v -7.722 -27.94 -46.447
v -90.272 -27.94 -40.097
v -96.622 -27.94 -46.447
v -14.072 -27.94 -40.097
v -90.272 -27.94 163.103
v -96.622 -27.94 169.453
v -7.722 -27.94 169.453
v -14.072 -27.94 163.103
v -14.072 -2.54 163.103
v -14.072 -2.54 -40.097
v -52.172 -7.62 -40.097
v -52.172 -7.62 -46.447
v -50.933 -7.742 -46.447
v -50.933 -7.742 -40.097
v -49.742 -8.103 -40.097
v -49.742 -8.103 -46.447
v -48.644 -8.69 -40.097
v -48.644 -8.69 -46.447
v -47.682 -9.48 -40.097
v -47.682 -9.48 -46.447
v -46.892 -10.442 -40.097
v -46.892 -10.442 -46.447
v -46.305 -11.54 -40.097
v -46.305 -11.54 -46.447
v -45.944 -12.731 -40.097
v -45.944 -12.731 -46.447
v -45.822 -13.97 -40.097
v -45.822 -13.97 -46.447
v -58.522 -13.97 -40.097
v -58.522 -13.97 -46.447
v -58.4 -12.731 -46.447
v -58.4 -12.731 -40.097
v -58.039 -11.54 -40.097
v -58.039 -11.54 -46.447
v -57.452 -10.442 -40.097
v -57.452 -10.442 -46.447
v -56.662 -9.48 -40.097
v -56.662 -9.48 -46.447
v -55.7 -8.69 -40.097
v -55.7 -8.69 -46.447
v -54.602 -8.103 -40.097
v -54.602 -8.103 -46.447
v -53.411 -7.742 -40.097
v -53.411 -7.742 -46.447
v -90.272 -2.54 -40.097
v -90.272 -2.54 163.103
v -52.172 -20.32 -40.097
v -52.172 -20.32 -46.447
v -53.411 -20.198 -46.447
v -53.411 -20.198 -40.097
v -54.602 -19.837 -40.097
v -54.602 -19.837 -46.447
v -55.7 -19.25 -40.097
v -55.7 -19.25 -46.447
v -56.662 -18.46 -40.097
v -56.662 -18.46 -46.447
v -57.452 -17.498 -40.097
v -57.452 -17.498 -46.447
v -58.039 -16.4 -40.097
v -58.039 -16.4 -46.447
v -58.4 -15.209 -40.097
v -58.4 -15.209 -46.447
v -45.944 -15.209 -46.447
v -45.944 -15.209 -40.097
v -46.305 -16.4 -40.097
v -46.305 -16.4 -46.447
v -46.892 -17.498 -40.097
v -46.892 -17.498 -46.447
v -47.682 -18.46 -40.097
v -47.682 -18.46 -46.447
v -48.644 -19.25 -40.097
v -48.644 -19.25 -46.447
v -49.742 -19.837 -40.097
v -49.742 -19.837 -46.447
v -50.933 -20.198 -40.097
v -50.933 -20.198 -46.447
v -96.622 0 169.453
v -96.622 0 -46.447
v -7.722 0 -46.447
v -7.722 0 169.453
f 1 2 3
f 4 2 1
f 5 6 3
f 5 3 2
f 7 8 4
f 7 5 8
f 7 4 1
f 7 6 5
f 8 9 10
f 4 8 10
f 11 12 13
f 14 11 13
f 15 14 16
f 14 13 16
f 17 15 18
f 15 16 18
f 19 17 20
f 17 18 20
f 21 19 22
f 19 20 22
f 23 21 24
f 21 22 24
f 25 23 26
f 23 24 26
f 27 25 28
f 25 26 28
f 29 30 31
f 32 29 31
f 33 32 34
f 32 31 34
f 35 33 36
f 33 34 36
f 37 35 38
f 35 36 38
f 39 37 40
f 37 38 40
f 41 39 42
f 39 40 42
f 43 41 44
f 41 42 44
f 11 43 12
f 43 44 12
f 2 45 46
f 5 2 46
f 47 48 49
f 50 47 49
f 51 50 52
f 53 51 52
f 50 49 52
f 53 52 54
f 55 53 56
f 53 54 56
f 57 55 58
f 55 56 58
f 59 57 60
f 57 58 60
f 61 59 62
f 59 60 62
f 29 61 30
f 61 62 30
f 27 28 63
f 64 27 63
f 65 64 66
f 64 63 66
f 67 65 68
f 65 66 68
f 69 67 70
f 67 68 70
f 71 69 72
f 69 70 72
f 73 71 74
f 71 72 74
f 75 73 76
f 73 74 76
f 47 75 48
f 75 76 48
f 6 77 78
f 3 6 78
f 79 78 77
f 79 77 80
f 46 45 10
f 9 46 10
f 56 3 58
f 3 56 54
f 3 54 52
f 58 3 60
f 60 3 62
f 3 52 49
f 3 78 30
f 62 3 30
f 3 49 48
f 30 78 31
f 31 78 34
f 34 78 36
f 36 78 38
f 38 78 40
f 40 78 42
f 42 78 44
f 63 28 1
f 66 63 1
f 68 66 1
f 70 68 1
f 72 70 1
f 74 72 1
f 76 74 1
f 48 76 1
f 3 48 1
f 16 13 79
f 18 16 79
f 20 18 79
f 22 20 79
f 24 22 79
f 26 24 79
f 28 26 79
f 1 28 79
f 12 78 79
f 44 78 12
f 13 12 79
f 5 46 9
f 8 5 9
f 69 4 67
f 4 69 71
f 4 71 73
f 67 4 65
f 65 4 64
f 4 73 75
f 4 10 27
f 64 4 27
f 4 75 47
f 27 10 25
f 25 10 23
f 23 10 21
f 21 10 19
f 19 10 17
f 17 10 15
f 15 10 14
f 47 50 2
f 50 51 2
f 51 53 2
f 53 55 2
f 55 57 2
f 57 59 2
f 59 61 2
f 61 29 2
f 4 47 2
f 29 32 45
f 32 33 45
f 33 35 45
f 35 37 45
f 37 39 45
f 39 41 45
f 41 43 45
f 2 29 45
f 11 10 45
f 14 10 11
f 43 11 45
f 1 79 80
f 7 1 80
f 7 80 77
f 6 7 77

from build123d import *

# Parameters (mm, degrees)
F0_W     = 6.35
F0_H     = 6.35
F1_DEPTH = 27.94
F2_W     = 88.9
F2_H     = 2.54
F3_DEPTH = 209.55
F5_DEPTH = 25.4


with BuildPart() as f1:
    # F0 (on Front) → F1 (new body)
    with BuildSketch(Plane.XZ):
        Polygon((-90.272094512, -40.0971807539), (-90.272094512, 163.1028192461), (-96.622094512, 163.1028192461), (-96.622094512, -46.4471807539), (-14.072094512, -46.4471807539), (-14.072094512, -40.0971807539), align=None)
        with Locations((-93.447094512, 166.2778192461)):
            Rectangle(F0_W, F0_H)
        Polygon((-90.272094512, 169.4528192461), (-90.272094512, 163.1028192461), (-14.072094512, 163.1028192461), (-14.072094512, -40.0971807539), (-7.722094512, -40.0971807539), (-7.722094512, 169.4528192461), align=None)
        with Locations((-10.897094512, -43.2721807539)):
            Rectangle(F0_W, F0_H)
    extrude(amount=F1_DEPTH)

    # F2 (on face) → F3 (join)
    with BuildSketch(Plane(origin=(0, 0, -46.4471807539), x_dir=(1, 0, 0), z_dir=(0, 0, -1))):
        with Locations((-52.172094512, 1.27)):
            Rectangle(F2_W, F2_H)
    extrude(amount=-F3_DEPTH)

    # F4 (on face) → F5 (cut)
    with BuildSketch(Plane(origin=(0, 0, -46.4471807539), x_dir=(1, 0, 0), z_dir=(0, 0, -1))):
        with BuildLine():
            Line((-58.522094512, 13.97), (-52.172094512, 13.97))
            Line((-52.172094512, 13.97), (-52.172094512, 20.32))
            ThreePointArc((-52.172094512, 20.32), (-56.6622225725, 18.4601280605), (-58.522094512, 13.97))
        make_face()
        with BuildLine():
            Line((-52.172094512, 13.97), (-45.822094512, 13.97))
            ThreePointArc((-45.822094512, 13.97), (-47.6819664515, 18.4601280605), (-52.172094512, 20.32))
            Line((-52.172094512, 20.32), (-52.172094512, 13.97))
        make_face()
        with BuildLine():
            ThreePointArc((-52.172094512, 7.62), (-47.6819664515, 9.4798719395), (-45.822094512, 13.97))
            Line((-45.822094512, 13.97), (-52.172094512, 13.97))
            Line((-52.172094512, 13.97), (-52.172094512, 7.62))
        make_face()
        with BuildLine():
            Line((-52.172094512, 7.62), (-52.172094512, 13.97))
            Line((-52.172094512, 13.97), (-58.522094512, 13.97))
            ThreePointArc((-58.522094512, 13.97), (-56.6622225725, 9.4798719395), (-52.172094512, 7.62))
        make_face()
    extrude(amount=-F5_DEPTH, mode=Mode.SUBTRACT)


solid = f1.part
